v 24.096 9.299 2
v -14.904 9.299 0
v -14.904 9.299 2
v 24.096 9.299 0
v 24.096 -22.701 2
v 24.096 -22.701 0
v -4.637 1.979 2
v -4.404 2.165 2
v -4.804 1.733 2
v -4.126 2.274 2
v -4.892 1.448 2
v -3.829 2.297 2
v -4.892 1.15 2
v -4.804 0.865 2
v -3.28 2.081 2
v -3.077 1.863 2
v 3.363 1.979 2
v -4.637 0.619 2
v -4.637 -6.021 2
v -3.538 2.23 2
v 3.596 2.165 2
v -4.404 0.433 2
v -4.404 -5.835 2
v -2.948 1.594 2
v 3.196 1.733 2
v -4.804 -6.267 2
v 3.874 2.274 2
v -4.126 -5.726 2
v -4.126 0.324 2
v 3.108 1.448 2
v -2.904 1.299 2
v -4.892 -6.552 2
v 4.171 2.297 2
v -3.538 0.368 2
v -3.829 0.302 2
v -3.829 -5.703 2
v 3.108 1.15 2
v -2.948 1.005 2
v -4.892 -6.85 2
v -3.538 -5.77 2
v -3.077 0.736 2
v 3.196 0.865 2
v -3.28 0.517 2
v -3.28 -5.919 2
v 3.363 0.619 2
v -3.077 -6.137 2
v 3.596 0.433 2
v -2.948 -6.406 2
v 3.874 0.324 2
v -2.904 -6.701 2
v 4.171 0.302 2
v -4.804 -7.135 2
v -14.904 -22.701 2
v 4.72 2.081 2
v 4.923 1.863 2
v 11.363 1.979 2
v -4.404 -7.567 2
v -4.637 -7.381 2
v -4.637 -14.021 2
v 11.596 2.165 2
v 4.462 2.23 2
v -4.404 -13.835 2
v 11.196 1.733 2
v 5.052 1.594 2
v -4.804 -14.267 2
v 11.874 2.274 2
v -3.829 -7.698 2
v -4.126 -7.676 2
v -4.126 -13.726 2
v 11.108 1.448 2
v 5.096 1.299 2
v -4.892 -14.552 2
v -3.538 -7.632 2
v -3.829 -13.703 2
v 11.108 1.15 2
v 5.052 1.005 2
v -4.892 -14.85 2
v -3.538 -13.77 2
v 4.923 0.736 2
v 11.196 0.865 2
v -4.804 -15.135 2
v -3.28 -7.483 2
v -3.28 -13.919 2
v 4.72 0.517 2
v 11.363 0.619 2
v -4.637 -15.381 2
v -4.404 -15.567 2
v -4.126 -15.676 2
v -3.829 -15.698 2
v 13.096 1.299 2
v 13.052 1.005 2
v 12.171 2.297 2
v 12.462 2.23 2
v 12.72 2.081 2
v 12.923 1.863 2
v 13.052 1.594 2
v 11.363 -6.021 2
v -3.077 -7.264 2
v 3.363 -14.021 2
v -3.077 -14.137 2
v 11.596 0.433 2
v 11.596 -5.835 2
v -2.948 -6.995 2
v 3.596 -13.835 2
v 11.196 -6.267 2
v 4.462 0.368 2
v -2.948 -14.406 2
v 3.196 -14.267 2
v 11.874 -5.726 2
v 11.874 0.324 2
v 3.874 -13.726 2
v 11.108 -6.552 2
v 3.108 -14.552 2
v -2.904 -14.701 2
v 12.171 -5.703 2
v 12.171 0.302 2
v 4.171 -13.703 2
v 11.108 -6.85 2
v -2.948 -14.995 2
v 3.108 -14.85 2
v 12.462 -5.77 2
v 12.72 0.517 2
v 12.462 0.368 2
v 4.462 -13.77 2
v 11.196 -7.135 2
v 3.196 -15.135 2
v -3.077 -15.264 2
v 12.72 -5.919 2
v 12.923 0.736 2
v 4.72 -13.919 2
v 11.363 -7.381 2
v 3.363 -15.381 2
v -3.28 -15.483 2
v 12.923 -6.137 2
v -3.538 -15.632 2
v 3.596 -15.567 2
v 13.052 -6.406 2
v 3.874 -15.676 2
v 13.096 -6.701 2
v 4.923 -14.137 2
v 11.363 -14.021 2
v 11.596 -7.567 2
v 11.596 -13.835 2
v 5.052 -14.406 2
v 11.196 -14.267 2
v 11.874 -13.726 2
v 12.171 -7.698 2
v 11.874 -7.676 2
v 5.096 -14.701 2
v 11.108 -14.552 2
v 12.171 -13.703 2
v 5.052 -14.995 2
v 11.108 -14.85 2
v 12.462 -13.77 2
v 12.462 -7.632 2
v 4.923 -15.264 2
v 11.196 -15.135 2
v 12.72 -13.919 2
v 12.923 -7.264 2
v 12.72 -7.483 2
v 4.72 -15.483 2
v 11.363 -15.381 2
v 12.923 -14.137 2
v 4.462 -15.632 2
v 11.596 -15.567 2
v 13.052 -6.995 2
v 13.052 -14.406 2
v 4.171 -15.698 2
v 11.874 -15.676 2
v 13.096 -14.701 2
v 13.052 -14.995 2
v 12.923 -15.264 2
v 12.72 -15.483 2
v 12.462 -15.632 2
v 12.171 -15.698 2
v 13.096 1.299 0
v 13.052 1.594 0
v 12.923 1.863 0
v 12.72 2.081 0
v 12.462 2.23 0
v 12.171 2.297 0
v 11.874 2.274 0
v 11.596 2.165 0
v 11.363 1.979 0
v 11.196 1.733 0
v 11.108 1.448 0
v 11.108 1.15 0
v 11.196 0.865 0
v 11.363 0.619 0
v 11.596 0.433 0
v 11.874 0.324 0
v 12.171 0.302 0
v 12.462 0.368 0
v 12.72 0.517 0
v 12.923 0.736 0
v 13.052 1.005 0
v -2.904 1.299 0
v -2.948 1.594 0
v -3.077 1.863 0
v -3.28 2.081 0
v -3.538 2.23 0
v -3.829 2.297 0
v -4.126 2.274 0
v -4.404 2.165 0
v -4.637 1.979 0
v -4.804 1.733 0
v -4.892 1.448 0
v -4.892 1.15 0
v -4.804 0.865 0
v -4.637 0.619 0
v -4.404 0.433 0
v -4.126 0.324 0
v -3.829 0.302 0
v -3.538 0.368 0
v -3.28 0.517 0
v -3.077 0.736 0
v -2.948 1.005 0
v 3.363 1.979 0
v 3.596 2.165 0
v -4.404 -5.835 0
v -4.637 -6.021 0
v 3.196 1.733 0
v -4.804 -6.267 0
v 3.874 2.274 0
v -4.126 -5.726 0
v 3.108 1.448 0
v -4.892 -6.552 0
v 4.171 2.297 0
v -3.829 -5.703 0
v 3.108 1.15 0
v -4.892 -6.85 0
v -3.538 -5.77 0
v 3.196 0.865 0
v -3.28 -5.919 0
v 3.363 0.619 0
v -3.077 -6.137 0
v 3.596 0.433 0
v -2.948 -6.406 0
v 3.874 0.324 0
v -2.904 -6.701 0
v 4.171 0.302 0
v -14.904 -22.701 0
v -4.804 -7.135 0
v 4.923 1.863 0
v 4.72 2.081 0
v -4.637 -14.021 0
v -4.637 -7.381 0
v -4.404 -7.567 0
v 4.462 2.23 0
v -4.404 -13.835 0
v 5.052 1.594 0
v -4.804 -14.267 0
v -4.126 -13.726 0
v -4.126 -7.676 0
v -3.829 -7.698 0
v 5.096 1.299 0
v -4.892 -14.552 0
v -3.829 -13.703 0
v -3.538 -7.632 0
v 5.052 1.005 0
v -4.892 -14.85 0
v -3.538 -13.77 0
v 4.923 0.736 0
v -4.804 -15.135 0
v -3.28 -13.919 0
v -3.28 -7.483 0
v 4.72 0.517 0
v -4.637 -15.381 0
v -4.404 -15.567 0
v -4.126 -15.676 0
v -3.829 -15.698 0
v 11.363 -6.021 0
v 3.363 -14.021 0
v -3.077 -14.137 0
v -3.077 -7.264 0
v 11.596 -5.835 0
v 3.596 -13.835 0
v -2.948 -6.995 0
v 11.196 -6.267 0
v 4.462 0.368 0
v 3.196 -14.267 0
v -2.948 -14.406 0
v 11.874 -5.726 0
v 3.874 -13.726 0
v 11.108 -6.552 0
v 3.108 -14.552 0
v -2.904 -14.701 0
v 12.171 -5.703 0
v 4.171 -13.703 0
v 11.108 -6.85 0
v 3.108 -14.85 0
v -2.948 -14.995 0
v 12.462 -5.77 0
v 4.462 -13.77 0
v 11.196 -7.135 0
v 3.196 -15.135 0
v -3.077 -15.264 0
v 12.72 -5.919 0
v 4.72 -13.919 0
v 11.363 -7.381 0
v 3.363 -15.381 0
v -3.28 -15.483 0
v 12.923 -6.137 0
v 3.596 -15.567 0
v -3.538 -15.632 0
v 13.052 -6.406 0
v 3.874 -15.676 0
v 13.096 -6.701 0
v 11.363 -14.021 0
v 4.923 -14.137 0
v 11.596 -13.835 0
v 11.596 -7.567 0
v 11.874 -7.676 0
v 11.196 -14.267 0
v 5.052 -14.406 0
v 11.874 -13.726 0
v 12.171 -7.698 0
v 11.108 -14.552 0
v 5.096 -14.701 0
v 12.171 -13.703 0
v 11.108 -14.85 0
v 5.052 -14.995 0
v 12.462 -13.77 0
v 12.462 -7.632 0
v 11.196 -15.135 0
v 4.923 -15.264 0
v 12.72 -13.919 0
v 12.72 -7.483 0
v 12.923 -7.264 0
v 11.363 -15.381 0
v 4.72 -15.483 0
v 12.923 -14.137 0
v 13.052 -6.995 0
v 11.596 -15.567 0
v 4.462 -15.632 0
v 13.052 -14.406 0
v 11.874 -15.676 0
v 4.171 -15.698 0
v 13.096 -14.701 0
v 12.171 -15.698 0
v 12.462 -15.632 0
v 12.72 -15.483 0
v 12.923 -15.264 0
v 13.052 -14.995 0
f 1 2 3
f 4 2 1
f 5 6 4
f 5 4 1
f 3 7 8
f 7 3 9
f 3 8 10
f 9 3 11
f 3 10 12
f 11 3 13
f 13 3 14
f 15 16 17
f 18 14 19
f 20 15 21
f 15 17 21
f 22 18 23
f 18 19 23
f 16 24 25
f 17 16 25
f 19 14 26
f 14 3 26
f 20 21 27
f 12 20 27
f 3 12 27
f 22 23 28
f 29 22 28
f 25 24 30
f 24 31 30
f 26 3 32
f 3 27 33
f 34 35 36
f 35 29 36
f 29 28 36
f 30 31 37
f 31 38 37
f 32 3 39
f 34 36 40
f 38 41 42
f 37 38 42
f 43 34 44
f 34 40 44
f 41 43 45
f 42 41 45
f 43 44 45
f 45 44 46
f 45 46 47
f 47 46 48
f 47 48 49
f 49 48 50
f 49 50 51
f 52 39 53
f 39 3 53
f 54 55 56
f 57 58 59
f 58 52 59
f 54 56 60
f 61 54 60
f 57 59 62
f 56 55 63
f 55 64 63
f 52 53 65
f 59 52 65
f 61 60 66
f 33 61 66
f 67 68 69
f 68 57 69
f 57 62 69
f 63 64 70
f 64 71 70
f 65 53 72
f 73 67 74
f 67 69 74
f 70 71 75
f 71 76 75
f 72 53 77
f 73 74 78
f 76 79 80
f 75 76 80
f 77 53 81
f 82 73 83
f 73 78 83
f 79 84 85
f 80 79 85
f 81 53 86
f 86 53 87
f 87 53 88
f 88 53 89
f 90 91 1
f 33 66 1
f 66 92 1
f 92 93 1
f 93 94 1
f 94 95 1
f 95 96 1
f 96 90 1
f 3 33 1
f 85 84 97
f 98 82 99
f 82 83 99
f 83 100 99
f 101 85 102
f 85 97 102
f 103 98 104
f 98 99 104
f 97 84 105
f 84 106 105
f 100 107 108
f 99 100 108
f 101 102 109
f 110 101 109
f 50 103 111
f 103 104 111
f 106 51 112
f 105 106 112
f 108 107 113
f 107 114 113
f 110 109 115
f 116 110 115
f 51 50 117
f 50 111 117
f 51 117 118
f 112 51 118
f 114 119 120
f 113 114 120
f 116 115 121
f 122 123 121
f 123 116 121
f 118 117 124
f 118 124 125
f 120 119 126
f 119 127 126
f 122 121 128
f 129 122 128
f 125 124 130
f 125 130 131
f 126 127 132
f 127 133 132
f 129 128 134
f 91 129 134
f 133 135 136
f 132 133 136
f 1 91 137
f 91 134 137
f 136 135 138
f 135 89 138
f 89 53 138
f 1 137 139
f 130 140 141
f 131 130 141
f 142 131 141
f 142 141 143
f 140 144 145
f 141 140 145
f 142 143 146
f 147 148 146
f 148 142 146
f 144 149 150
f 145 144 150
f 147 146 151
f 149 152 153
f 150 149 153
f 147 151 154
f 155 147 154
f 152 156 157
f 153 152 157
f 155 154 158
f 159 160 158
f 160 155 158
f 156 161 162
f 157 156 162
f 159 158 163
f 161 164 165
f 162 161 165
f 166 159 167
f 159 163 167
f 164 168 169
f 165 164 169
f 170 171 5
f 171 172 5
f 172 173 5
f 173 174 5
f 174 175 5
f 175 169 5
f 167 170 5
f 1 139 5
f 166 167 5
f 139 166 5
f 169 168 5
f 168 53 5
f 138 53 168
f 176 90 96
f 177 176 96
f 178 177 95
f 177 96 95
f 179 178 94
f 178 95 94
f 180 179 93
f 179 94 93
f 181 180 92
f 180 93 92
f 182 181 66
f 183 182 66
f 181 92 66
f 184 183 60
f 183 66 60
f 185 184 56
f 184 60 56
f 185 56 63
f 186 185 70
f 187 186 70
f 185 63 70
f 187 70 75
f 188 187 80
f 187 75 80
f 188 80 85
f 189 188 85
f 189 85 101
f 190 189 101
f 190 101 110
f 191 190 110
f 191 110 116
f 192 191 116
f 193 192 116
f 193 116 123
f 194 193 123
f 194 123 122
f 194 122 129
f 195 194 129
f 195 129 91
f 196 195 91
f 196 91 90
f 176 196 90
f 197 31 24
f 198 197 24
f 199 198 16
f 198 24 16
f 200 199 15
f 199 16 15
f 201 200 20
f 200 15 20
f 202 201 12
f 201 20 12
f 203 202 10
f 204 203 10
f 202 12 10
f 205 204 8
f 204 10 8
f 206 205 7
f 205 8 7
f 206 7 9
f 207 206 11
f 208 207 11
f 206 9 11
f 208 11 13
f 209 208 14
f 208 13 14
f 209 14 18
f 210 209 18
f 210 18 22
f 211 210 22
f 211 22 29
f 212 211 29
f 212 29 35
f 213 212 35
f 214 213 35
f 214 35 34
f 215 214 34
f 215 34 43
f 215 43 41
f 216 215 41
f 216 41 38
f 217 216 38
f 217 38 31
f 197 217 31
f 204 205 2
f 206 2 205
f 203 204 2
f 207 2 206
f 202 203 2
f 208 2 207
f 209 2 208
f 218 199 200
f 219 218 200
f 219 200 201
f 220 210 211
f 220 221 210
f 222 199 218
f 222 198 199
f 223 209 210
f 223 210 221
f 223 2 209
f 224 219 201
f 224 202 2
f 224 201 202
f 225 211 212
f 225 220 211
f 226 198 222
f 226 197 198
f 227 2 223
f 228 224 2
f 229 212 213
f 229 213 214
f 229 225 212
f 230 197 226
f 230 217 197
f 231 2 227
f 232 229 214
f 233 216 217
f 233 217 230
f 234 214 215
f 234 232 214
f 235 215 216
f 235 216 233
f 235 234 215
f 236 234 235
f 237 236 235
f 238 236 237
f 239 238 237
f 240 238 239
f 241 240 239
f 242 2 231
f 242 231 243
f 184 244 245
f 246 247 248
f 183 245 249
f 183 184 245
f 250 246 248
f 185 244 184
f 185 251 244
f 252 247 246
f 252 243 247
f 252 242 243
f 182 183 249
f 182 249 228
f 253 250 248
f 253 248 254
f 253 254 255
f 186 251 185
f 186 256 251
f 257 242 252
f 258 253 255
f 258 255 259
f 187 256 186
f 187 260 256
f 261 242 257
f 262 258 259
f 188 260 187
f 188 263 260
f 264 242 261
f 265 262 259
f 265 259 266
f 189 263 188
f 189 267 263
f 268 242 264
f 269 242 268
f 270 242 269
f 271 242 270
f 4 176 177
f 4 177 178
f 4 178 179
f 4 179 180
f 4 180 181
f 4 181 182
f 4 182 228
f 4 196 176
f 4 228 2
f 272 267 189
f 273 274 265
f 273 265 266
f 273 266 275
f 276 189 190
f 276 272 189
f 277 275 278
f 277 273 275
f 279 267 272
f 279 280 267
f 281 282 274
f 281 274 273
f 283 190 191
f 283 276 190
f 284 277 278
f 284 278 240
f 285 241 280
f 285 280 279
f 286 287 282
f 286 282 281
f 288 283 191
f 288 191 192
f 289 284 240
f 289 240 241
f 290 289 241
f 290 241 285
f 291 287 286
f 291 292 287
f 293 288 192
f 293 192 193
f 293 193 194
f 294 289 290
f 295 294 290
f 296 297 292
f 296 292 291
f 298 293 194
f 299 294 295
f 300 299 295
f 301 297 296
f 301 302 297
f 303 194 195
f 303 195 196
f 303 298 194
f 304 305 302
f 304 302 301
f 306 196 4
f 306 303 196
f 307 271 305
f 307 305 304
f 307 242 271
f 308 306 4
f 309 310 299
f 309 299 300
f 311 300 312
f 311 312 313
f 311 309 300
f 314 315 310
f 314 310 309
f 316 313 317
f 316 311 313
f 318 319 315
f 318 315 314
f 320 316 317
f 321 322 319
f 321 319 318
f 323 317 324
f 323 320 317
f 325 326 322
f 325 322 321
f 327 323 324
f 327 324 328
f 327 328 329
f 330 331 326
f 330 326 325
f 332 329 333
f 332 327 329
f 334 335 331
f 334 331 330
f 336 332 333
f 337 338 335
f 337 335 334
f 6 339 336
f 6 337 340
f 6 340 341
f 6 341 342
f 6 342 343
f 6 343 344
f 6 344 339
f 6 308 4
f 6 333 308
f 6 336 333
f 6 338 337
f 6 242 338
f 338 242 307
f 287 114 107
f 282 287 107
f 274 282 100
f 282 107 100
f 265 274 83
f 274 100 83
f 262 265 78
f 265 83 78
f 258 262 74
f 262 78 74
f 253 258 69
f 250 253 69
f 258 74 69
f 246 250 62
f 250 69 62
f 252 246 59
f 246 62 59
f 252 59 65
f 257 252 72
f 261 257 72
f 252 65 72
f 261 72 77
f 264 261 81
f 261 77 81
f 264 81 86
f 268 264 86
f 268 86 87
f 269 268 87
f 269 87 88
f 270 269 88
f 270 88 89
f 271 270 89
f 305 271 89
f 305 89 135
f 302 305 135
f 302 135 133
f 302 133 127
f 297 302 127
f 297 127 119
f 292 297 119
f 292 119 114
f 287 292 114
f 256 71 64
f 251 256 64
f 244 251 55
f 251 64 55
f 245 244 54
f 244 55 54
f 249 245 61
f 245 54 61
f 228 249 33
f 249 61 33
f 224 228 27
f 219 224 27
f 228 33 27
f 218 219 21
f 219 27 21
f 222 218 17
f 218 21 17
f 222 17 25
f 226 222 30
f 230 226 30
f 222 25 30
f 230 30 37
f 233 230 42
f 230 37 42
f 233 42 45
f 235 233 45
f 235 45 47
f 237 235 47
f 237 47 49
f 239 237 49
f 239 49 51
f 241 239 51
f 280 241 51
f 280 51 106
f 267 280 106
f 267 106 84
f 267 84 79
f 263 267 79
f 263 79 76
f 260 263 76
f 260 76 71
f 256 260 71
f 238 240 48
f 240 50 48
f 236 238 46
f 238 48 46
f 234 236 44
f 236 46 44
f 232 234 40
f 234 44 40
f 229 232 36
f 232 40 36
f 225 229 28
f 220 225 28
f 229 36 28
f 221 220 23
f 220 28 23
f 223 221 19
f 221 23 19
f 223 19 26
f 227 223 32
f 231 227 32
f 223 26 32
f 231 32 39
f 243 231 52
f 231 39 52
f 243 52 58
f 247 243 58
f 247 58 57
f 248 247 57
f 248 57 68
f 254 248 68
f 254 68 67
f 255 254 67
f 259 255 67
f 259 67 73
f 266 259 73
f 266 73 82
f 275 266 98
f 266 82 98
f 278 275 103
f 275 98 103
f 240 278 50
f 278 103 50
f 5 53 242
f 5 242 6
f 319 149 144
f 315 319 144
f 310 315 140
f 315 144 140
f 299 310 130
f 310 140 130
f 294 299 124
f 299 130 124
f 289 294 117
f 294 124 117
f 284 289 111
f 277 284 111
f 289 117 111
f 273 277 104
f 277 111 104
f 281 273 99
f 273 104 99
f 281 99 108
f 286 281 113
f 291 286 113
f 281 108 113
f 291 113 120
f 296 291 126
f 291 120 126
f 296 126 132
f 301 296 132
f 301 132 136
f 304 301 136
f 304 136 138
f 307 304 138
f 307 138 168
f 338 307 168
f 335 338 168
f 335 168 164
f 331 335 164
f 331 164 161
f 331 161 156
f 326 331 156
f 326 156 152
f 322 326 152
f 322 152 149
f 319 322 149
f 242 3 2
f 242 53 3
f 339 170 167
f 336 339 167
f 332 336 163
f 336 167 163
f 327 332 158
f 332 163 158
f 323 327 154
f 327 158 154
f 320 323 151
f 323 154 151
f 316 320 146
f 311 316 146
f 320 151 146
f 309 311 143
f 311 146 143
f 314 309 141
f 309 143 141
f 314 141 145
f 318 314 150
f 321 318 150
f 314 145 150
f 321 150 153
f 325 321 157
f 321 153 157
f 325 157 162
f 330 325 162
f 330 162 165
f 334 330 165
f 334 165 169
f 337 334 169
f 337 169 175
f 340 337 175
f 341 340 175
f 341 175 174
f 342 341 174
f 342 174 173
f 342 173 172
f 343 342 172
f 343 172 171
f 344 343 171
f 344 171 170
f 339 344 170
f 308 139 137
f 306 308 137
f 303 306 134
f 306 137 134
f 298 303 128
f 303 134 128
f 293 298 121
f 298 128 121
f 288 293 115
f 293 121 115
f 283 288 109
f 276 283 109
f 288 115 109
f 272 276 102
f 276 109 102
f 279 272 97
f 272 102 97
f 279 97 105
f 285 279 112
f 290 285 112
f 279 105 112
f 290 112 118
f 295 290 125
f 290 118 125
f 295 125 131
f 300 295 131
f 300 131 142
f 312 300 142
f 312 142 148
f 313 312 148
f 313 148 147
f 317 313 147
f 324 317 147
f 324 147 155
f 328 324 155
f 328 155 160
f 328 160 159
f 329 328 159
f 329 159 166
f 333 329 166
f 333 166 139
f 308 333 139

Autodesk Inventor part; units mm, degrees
ref_plane "YZ Plane" through (0, 0, 0) normal (1, 0, 0) x (0, 1, 0)
ref_plane "XZ Plane" through (0, 0, 0) normal (0, 1, 0) x (-1, 0, 0)
ref_plane "XY Plane" through (0, 0, 0) normal (0, 0, 1) x (1, 0, 0)
sketch "Sketch1" plane through (0, 0, 0) normal (0, 0, 1) x (1, 0, 0)
  line L0 (-15.9035, 8.2993) -> (24.0965, 8.2993)
  line L1 (24.0965, 8.2993) -> (24.0965, -21.7007)
  line L2 (24.0965, -21.7007) -> (-15.9035, -21.7007)
  line L3 (-15.9035, -21.7007) -> (-15.9035, 8.2993)
  point P0 (0, 0)
  dimension "d0" = 40
  dimension "d1" = 30
extrude "Extrusion1" add sketch "Sketch1" along normal blind 2
sketch "Sketch2" plane through (0, 0, 2) normal (0, 0, 1) x (1, 0, 0)
  line L0 (-15.9035, -21.7007) -> (-15.9035, 8.2993) projected
  line L1 (24.0965, -21.7007) -> (-15.9035, -21.7007) projected
  line L2 (-15.9035, -6.7007) -> (4.0965, -6.7007)
  line L3 (4.0965, -6.7007) -> (4.0965, -14.7007)
  line L4 (4.0965, -14.7007) -> (-3.9035, -14.7007)
  line L5 (-3.9035, -14.7007) -> (-3.9035, 1.2993)
  line L6 (-3.9035, 1.2993) -> (12.0965, 1.2993)
  line L7 (12.0965, 1.2993) -> (12.0965, -14.7007)
  circle A0 centre (12.0965, -6.7007) radius 1
  circle A1 centre (12.0965, 1.2993) radius 1
  circle A2 centre (4.0965, 1.2993) radius 1
  circle A3 centre (-3.9035, 1.2993) radius 1
  circle A4 centre (-3.9035, -6.7007) radius 1
  circle A5 centre (-3.9035, -14.7007) radius 1
  circle A6 centre (4.0965, -14.7007) radius 1
  circle A7 centre (12.0965, -14.7007) radius 1
  point P0 (0, 0)
  dimension "d4" = 8
  dimension "d5" = 8
  dimension "d6" = 16
  dimension "d7" = 16
  dimension "d8" = 16
  dimension "d9" = 2
extrude "Extrusion2" cut sketch "Sketch2" against normal blind 2 contours A7 | A0 L7 | L7 A0 | A1 L7 L6 | L6 L7 A1 | A2 L6 | L6 A2 | A3 L6 L5 | L5 L6 A3 | A4 L5 L2 | L2 L5 A4 | L5 A4 L2 | L2 A4 L5 | A6 L4 L3 | L3 L4 A6 | A5 L4 L5 | L5 L4 A5
sketch "Sketch3" plane through (-15.9035, -21.7007, 0) normal (0, -1, 0) x (1, 0, 0)
  line L0 (40, 2) -> (0, 2) projected
  line L1 (0, 0) -> (0, 2) projected
  line L2 (40, 0) -> (0, 0) projected
  line L3 (40, 0) -> (40, 2) projected
  point P0 (15.9035, 0)
extrude "Extrusion3" add sketch "Sketch3" along normal blind 1
sketch "Sketch4" plane through (-15.9035, 8.2993, 0) normal (0, 1, 0) x (1, 0, 0)
  line L0 (0, -2) -> (40, -2) projected
  line L1 (40, 0) -> (40, -2) projected
  line L2 (0, 0) -> (40, 0) projected
  line L3 (0, 0) -> (0, -2) projected
  point P0 (15.9035, 0)
extrude "Extrusion4" add sketch "Sketch4" along normal blind 1
sketch "Sketch7" plane through (-15.9035, -22.7007, 0) normal (0, -1, 0) x (1, 0, 0)
  line L0 (40, 0) -> (0, 0) projected
  line L1 (0, 2) -> (1, 2)
  line L2 (1, 2) -> (1, 0)
  line L3 (1, 0) -> (0, 0)
  line L4 (0, 0) -> (0, 2)
  point P0 (15.9035, 0)
  dimension "d18" = 1
extrude "Extrusion6" cut sketch "Sketch7" against normal blind 50.8
properties part number "base1"
